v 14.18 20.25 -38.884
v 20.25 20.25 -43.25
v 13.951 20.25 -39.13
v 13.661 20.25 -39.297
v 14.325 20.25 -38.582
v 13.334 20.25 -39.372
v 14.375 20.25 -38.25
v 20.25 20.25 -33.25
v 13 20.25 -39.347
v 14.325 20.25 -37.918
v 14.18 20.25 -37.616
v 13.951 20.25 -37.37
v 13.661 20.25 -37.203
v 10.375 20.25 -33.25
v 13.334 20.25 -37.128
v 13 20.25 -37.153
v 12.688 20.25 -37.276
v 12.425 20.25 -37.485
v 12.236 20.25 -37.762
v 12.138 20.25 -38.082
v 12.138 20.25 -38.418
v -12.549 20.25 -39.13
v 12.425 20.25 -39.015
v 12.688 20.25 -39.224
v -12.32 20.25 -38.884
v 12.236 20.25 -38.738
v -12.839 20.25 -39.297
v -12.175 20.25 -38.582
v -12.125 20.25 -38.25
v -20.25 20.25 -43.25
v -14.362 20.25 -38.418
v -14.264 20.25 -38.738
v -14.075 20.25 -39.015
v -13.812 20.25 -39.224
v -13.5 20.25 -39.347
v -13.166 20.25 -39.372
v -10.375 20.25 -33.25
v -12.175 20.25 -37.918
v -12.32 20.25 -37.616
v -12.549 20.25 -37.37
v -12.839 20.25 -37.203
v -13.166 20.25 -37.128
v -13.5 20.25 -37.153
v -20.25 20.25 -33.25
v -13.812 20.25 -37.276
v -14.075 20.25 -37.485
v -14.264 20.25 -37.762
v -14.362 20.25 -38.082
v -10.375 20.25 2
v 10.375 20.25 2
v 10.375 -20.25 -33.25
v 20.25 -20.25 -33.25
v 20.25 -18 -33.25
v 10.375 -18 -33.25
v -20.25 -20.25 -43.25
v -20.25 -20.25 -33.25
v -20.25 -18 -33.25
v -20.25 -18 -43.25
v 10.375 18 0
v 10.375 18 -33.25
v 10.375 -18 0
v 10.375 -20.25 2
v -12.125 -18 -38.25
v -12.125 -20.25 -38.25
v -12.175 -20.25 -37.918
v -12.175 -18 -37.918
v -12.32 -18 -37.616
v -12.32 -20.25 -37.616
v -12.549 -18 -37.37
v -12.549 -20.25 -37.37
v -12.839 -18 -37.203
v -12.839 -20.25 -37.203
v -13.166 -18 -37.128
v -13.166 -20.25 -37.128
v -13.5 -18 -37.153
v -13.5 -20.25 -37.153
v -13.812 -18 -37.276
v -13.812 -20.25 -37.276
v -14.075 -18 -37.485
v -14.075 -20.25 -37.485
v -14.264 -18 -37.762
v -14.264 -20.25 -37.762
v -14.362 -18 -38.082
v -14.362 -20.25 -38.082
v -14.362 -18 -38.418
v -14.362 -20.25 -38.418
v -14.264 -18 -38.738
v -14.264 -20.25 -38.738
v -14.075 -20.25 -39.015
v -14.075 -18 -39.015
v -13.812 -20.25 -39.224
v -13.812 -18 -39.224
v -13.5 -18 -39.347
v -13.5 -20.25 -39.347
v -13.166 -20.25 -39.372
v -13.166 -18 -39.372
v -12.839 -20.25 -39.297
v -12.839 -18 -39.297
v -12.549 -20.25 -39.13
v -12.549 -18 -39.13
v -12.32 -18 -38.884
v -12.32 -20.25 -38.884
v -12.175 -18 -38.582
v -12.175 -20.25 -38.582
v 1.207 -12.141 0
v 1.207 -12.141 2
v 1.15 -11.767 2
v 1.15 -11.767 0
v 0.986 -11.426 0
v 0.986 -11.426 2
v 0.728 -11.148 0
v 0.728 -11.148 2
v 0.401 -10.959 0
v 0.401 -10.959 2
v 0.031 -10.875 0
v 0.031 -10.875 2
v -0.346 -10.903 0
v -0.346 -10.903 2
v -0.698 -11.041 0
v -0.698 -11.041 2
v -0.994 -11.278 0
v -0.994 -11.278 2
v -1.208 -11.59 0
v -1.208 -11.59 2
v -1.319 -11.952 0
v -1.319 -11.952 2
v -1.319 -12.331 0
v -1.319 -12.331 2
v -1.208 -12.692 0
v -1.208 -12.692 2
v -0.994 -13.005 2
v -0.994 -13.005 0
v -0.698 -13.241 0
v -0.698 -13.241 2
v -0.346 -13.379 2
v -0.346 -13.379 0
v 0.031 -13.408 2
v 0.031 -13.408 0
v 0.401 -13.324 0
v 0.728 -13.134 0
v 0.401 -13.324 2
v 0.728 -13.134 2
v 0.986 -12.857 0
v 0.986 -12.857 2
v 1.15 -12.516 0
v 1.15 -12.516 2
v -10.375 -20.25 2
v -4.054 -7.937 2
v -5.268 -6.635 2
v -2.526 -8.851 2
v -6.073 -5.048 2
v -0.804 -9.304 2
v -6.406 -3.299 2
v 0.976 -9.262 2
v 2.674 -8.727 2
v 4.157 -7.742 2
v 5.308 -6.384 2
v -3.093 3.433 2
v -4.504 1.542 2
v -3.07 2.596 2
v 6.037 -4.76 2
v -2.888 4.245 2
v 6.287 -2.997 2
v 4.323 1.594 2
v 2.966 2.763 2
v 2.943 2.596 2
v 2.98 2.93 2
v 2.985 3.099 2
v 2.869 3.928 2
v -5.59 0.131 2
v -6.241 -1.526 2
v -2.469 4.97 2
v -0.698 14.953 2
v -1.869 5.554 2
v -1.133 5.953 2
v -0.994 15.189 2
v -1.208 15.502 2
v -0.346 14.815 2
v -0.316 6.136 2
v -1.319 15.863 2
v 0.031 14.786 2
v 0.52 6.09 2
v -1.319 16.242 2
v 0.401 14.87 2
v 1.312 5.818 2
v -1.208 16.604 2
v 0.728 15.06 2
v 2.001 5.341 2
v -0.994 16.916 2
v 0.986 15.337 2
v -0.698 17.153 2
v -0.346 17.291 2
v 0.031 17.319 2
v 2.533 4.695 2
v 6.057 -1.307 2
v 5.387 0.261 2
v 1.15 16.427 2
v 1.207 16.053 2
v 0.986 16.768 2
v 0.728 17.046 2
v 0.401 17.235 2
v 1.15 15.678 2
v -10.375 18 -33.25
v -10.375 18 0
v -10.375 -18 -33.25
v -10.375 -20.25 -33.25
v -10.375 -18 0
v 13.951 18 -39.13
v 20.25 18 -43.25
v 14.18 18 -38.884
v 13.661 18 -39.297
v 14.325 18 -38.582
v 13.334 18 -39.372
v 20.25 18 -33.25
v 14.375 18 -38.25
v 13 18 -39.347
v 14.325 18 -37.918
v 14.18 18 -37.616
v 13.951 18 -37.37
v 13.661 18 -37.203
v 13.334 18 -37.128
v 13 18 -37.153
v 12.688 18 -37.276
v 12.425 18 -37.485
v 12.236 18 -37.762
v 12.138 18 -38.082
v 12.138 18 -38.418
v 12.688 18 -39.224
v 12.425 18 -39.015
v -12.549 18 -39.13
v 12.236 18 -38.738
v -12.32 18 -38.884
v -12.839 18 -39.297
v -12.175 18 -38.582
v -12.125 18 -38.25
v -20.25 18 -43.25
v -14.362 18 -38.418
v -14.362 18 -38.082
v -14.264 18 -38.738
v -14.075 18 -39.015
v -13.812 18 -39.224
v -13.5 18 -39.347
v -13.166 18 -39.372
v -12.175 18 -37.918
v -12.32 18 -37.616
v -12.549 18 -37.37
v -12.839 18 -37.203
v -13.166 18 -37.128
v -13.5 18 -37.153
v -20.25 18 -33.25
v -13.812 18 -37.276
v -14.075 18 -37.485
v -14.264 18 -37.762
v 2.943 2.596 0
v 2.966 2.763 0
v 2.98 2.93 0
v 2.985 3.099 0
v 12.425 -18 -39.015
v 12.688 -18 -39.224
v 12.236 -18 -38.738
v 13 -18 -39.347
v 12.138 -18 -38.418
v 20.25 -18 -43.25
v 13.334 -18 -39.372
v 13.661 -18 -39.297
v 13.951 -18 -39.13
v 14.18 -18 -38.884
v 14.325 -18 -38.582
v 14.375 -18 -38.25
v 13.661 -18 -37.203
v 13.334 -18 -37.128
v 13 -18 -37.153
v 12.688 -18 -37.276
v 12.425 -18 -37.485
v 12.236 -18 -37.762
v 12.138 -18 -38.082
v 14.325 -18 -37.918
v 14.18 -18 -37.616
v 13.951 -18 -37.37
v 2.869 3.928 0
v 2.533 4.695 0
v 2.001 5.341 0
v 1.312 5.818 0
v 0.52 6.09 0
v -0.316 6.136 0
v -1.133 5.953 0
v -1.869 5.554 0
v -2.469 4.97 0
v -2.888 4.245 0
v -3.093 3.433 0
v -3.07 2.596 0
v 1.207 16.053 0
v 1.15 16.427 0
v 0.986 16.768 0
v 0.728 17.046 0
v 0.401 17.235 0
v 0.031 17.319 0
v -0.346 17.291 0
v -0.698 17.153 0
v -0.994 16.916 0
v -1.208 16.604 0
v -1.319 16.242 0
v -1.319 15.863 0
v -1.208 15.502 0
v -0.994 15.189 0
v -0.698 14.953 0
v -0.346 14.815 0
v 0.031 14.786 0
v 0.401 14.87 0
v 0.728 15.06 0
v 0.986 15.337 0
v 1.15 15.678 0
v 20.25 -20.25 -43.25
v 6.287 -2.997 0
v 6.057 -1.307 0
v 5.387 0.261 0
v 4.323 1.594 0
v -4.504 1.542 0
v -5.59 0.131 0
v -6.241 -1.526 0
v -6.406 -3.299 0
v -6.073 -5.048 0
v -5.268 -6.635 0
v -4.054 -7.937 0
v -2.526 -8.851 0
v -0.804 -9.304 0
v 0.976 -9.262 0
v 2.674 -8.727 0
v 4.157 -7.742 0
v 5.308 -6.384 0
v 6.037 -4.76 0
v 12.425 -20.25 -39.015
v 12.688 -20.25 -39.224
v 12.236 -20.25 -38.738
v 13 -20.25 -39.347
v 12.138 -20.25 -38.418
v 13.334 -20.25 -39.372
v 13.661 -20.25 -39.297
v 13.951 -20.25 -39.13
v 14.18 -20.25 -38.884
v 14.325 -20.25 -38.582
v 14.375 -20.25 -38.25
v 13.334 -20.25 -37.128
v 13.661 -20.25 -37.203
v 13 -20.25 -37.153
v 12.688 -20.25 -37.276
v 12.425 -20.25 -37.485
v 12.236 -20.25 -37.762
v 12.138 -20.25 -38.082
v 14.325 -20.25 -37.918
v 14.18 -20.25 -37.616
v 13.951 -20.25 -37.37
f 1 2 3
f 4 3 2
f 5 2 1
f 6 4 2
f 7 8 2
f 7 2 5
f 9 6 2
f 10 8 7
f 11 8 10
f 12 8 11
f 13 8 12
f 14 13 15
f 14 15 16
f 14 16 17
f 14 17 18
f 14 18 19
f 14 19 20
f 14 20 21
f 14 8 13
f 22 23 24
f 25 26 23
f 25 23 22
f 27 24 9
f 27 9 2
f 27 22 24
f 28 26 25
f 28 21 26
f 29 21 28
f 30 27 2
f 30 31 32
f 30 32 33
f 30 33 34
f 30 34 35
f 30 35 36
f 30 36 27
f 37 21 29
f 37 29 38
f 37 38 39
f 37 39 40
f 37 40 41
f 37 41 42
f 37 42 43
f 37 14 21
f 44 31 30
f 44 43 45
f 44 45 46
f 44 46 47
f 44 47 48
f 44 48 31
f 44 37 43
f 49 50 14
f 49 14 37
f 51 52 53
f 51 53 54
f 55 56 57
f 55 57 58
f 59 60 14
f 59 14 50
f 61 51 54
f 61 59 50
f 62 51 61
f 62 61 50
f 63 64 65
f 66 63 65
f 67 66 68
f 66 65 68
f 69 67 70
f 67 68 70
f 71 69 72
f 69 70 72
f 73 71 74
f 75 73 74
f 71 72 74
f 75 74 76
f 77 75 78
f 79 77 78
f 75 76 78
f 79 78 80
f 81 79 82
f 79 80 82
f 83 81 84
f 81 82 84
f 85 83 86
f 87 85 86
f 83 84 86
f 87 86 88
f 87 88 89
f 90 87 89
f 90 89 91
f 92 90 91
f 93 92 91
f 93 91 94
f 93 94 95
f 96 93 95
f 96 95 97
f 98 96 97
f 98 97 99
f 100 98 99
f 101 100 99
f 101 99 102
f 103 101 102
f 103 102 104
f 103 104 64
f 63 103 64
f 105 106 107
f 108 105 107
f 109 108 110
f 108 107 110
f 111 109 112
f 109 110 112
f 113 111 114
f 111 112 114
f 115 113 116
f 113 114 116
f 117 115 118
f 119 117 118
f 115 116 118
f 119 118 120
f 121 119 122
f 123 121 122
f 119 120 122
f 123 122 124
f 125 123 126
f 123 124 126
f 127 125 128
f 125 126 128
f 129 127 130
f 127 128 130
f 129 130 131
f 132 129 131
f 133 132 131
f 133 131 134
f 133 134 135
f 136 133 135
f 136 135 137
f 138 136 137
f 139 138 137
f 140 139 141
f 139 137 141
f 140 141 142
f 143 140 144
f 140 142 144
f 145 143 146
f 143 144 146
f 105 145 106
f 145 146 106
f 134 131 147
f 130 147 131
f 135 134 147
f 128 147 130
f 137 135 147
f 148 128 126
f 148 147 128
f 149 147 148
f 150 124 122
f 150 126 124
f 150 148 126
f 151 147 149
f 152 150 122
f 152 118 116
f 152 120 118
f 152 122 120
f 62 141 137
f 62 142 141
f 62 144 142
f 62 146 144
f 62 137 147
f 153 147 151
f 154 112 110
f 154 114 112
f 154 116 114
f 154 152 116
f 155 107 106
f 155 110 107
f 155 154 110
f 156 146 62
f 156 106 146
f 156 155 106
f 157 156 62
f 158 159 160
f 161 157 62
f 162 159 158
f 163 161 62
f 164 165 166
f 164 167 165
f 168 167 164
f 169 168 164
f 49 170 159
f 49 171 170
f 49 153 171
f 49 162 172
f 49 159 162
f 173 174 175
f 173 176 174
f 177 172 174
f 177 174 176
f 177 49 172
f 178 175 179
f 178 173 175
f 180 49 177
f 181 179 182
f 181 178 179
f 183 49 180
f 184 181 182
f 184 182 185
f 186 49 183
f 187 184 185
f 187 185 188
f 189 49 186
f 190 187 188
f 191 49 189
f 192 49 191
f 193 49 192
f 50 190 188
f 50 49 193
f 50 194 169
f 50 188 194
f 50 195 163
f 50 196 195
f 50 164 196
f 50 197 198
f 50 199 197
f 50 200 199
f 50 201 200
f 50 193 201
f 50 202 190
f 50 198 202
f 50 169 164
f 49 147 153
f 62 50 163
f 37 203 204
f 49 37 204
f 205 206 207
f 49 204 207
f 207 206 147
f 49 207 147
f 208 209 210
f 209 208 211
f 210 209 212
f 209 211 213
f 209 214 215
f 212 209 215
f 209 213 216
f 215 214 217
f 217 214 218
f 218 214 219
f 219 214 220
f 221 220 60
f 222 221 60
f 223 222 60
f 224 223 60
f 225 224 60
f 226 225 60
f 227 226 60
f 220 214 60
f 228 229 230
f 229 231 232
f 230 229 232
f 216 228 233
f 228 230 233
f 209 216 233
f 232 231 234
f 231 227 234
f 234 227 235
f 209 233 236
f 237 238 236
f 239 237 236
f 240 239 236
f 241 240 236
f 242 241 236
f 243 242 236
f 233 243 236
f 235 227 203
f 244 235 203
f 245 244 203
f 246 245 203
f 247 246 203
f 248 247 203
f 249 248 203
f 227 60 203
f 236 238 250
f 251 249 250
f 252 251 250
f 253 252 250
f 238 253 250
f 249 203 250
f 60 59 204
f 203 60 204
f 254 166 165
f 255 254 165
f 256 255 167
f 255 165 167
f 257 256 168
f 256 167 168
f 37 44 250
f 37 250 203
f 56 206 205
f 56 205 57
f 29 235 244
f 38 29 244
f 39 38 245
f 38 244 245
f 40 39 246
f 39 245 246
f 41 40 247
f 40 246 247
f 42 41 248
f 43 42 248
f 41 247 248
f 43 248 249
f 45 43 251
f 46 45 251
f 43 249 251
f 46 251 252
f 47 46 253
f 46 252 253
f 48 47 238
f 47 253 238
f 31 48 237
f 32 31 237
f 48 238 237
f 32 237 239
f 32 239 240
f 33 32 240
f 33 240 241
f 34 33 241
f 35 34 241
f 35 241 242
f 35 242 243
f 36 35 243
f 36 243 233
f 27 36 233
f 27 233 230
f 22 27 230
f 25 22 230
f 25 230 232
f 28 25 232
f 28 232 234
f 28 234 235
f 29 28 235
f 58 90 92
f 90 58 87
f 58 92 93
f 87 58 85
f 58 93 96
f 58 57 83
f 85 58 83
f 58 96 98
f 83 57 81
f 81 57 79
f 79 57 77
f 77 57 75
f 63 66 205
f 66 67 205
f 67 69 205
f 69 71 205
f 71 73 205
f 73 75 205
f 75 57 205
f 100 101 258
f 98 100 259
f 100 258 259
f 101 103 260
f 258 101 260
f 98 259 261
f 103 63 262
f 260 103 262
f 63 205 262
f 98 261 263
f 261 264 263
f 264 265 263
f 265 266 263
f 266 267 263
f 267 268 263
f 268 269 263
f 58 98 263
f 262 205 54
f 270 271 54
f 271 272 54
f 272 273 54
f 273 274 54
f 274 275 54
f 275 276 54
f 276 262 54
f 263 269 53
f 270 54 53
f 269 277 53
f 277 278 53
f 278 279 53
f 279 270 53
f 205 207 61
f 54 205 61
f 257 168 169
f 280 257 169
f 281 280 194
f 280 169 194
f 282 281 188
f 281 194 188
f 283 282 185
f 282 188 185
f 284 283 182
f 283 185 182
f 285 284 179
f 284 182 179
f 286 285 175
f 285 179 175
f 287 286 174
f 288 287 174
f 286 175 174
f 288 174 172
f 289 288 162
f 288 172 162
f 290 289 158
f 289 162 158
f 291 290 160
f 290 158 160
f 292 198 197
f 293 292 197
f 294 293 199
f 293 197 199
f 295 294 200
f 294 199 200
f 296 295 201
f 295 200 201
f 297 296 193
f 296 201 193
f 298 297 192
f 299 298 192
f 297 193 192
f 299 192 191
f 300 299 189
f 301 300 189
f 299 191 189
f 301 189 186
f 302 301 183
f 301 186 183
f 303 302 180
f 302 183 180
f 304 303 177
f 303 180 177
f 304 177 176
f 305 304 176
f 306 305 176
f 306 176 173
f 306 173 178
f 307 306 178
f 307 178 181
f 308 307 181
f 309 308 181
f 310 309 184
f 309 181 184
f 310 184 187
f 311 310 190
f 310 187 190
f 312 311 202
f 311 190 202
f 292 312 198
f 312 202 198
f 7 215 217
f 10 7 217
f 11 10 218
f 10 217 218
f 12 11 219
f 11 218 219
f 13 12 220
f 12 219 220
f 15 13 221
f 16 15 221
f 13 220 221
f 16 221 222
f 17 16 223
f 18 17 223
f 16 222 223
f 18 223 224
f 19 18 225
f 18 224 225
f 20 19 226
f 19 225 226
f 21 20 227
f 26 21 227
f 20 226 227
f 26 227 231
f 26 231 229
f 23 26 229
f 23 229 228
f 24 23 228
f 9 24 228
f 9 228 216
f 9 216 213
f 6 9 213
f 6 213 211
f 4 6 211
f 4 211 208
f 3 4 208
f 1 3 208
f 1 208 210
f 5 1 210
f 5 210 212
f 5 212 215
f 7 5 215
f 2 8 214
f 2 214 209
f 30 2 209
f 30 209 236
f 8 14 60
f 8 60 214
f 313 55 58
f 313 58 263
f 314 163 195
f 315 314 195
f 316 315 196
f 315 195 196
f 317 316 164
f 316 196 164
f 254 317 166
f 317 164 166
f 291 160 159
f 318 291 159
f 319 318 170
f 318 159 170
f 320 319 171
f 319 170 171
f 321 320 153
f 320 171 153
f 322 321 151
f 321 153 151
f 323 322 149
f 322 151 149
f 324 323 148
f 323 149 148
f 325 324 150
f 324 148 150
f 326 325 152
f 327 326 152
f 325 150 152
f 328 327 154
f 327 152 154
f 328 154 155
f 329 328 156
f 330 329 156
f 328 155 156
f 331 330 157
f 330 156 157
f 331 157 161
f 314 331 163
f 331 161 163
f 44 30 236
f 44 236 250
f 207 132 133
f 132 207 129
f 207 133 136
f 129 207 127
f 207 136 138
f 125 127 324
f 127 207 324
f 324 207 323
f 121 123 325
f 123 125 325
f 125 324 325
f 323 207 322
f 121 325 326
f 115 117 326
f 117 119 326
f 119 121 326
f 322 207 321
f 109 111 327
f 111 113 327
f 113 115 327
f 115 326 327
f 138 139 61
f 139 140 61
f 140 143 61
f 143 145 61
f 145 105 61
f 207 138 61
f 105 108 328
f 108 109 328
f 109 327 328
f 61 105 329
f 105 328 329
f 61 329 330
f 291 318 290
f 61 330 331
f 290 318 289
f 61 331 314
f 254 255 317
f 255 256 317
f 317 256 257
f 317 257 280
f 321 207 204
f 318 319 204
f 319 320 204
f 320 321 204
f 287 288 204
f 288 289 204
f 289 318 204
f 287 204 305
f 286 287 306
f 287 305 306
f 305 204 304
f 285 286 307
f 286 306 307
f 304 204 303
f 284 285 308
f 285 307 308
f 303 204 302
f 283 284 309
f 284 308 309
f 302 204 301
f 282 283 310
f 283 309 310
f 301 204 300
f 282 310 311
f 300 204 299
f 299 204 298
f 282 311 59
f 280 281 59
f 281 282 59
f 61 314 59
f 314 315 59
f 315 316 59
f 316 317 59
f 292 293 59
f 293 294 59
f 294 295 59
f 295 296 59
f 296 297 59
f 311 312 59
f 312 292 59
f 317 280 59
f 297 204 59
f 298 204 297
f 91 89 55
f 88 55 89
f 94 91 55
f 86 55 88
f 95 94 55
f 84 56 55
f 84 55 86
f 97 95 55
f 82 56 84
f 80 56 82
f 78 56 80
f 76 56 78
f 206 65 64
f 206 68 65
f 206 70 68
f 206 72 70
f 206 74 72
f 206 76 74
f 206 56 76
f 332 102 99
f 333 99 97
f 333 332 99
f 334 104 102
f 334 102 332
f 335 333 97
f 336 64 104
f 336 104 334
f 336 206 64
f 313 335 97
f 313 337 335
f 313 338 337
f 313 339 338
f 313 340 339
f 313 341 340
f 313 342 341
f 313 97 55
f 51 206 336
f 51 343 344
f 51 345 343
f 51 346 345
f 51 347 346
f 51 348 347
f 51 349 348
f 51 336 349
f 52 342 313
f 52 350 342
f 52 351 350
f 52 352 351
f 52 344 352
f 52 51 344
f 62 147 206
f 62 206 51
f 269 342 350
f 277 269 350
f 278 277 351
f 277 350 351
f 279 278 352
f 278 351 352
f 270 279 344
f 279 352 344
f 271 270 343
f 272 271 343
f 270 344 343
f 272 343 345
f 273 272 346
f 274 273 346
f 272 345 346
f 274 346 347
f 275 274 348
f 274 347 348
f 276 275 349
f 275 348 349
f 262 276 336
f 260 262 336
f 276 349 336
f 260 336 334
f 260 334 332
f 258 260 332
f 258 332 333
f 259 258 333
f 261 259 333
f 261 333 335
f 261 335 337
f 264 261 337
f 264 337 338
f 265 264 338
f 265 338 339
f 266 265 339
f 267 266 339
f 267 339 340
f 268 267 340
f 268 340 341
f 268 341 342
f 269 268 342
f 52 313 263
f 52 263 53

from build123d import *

# Parameters (mm, degrees)
F0_W      = 20.75
F0_H      = 40.5
F2_DEPTH  = 2
F3_START  = 18
F1_W      = 20.75
F1_H      = 33.25
F3_DEPTH  = 2.25
F4_START  = -18
F4_DEPTH  = 2.25
F6_DEPTH  = 2.25
F8_DEPTH  = 2.25
F9_R      = 1.125
F10_DEPTH = 40.501
F11_R     = 1.27
F12_DEPTH = 2


with BuildPart() as f2:
    # F0 (on Top) → F2 (new body)
    with BuildSketch(Plane.XY):
        Rectangle(F0_W, F0_H)
    extrude(amount=F2_DEPTH)

    # F1 (on Front) → F3 (join)
    with BuildSketch(Plane.XZ.offset(F3_START)):
        with Locations((0, -16.625)):
            Rectangle(F1_W, F1_H)
    extrude(amount=F3_DEPTH)

    # F1 (on Front) → F4 (join)
    with BuildSketch(Plane.XZ.offset(F4_START)):
        with Locations((0, -16.625)):
            Rectangle(F1_W, F1_H)
    extrude(amount=-F4_DEPTH)

    # F5 (on face) → F6 (join, through all)
    with BuildSketch(Plane(origin=(0, 20.25, 0), x_dir=(-1, 0, 0), z_dir=(0, 1, 0))):
        Polygon((-10.375, -33.25), (-20.25, -33.25), (-20.25, -43.25), (20.25, -43.25), (20.25, -33.25), (10.375, -33.25), align=None)
    extrude(amount=-F6_DEPTH)

    # F7 (on face) → F8 (join, through all)
    with BuildSketch(Plane.XZ.offset(20.25)):
        Polygon((0, -33.25), (-20.25, -33.25), (-20.25, -43.25), (20.25, -43.25), (20.25, -33.25), align=None)
    extrude(amount=-F8_DEPTH)

    # F9 (on face) → F10 (cut, through all)
    with BuildSketch(Plane.XZ.offset(20.25)):
        with Locations((-13.25, -38.25)):
            Circle(F9_R)
        with Locations((13.25, -38.25)):
            Circle(F9_R)
    extrude(amount=-F10_DEPTH, mode=Mode.SUBTRACT)

    # F11 (on face) → F12 (cut, through all)
    with BuildSketch(Plane.XY.offset(2)):
        with BuildLine():
            ThreePointArc((-3.0697393815, 2.5959719896), (-3.3217599094, -8.4476517557), (6.286518813, -2.9973196771))
            ThreePointArc((6.286518813, -2.9973196771), (5.3868508916, 0.2609590453), (2.9427770074, 2.5959719896))
            ThreePointArc((2.9427770074, 2.5959719896), (-0.063481187, 0.0506803229), (-3.0697393815, 2.5959719896))
        make_face()
        with BuildLine():
            ThreePointArc((-3.0697393815, 2.5959719896), (-0.063481187, 3.3526803229), (2.9427770074, 2.5959719896))
            ThreePointArc((2.9427770074, 2.5959719896), (2.9740654362, 2.846461149), (2.984518813, 3.0986803229))
            ThreePointArc((2.984518813, 3.0986803229), (-0.315700361, 6.1362269461), (-3.0697393815, 2.5959719896))
        make_face()
        with BuildLine():
            ThreePointArc((-3.0697393815, 2.5959719896), (-0.063481187, 0.0506803229), (2.9427770074, 2.5959719896))
            ThreePointArc((2.9427770074, 2.5959719896), (-0.063481187, 3.3526803229), (-3.0697393815, 2.5959719896))
        make_face()
        with Locations((-0.063481187, -12.1413196771)):
            Circle(F11_R)
        with Locations((-0.063481187, 16.0526803229)):
            Circle(F11_R)
    extrude(amount=-F12_DEPTH, mode=Mode.SUBTRACT)


solid = f2.part
